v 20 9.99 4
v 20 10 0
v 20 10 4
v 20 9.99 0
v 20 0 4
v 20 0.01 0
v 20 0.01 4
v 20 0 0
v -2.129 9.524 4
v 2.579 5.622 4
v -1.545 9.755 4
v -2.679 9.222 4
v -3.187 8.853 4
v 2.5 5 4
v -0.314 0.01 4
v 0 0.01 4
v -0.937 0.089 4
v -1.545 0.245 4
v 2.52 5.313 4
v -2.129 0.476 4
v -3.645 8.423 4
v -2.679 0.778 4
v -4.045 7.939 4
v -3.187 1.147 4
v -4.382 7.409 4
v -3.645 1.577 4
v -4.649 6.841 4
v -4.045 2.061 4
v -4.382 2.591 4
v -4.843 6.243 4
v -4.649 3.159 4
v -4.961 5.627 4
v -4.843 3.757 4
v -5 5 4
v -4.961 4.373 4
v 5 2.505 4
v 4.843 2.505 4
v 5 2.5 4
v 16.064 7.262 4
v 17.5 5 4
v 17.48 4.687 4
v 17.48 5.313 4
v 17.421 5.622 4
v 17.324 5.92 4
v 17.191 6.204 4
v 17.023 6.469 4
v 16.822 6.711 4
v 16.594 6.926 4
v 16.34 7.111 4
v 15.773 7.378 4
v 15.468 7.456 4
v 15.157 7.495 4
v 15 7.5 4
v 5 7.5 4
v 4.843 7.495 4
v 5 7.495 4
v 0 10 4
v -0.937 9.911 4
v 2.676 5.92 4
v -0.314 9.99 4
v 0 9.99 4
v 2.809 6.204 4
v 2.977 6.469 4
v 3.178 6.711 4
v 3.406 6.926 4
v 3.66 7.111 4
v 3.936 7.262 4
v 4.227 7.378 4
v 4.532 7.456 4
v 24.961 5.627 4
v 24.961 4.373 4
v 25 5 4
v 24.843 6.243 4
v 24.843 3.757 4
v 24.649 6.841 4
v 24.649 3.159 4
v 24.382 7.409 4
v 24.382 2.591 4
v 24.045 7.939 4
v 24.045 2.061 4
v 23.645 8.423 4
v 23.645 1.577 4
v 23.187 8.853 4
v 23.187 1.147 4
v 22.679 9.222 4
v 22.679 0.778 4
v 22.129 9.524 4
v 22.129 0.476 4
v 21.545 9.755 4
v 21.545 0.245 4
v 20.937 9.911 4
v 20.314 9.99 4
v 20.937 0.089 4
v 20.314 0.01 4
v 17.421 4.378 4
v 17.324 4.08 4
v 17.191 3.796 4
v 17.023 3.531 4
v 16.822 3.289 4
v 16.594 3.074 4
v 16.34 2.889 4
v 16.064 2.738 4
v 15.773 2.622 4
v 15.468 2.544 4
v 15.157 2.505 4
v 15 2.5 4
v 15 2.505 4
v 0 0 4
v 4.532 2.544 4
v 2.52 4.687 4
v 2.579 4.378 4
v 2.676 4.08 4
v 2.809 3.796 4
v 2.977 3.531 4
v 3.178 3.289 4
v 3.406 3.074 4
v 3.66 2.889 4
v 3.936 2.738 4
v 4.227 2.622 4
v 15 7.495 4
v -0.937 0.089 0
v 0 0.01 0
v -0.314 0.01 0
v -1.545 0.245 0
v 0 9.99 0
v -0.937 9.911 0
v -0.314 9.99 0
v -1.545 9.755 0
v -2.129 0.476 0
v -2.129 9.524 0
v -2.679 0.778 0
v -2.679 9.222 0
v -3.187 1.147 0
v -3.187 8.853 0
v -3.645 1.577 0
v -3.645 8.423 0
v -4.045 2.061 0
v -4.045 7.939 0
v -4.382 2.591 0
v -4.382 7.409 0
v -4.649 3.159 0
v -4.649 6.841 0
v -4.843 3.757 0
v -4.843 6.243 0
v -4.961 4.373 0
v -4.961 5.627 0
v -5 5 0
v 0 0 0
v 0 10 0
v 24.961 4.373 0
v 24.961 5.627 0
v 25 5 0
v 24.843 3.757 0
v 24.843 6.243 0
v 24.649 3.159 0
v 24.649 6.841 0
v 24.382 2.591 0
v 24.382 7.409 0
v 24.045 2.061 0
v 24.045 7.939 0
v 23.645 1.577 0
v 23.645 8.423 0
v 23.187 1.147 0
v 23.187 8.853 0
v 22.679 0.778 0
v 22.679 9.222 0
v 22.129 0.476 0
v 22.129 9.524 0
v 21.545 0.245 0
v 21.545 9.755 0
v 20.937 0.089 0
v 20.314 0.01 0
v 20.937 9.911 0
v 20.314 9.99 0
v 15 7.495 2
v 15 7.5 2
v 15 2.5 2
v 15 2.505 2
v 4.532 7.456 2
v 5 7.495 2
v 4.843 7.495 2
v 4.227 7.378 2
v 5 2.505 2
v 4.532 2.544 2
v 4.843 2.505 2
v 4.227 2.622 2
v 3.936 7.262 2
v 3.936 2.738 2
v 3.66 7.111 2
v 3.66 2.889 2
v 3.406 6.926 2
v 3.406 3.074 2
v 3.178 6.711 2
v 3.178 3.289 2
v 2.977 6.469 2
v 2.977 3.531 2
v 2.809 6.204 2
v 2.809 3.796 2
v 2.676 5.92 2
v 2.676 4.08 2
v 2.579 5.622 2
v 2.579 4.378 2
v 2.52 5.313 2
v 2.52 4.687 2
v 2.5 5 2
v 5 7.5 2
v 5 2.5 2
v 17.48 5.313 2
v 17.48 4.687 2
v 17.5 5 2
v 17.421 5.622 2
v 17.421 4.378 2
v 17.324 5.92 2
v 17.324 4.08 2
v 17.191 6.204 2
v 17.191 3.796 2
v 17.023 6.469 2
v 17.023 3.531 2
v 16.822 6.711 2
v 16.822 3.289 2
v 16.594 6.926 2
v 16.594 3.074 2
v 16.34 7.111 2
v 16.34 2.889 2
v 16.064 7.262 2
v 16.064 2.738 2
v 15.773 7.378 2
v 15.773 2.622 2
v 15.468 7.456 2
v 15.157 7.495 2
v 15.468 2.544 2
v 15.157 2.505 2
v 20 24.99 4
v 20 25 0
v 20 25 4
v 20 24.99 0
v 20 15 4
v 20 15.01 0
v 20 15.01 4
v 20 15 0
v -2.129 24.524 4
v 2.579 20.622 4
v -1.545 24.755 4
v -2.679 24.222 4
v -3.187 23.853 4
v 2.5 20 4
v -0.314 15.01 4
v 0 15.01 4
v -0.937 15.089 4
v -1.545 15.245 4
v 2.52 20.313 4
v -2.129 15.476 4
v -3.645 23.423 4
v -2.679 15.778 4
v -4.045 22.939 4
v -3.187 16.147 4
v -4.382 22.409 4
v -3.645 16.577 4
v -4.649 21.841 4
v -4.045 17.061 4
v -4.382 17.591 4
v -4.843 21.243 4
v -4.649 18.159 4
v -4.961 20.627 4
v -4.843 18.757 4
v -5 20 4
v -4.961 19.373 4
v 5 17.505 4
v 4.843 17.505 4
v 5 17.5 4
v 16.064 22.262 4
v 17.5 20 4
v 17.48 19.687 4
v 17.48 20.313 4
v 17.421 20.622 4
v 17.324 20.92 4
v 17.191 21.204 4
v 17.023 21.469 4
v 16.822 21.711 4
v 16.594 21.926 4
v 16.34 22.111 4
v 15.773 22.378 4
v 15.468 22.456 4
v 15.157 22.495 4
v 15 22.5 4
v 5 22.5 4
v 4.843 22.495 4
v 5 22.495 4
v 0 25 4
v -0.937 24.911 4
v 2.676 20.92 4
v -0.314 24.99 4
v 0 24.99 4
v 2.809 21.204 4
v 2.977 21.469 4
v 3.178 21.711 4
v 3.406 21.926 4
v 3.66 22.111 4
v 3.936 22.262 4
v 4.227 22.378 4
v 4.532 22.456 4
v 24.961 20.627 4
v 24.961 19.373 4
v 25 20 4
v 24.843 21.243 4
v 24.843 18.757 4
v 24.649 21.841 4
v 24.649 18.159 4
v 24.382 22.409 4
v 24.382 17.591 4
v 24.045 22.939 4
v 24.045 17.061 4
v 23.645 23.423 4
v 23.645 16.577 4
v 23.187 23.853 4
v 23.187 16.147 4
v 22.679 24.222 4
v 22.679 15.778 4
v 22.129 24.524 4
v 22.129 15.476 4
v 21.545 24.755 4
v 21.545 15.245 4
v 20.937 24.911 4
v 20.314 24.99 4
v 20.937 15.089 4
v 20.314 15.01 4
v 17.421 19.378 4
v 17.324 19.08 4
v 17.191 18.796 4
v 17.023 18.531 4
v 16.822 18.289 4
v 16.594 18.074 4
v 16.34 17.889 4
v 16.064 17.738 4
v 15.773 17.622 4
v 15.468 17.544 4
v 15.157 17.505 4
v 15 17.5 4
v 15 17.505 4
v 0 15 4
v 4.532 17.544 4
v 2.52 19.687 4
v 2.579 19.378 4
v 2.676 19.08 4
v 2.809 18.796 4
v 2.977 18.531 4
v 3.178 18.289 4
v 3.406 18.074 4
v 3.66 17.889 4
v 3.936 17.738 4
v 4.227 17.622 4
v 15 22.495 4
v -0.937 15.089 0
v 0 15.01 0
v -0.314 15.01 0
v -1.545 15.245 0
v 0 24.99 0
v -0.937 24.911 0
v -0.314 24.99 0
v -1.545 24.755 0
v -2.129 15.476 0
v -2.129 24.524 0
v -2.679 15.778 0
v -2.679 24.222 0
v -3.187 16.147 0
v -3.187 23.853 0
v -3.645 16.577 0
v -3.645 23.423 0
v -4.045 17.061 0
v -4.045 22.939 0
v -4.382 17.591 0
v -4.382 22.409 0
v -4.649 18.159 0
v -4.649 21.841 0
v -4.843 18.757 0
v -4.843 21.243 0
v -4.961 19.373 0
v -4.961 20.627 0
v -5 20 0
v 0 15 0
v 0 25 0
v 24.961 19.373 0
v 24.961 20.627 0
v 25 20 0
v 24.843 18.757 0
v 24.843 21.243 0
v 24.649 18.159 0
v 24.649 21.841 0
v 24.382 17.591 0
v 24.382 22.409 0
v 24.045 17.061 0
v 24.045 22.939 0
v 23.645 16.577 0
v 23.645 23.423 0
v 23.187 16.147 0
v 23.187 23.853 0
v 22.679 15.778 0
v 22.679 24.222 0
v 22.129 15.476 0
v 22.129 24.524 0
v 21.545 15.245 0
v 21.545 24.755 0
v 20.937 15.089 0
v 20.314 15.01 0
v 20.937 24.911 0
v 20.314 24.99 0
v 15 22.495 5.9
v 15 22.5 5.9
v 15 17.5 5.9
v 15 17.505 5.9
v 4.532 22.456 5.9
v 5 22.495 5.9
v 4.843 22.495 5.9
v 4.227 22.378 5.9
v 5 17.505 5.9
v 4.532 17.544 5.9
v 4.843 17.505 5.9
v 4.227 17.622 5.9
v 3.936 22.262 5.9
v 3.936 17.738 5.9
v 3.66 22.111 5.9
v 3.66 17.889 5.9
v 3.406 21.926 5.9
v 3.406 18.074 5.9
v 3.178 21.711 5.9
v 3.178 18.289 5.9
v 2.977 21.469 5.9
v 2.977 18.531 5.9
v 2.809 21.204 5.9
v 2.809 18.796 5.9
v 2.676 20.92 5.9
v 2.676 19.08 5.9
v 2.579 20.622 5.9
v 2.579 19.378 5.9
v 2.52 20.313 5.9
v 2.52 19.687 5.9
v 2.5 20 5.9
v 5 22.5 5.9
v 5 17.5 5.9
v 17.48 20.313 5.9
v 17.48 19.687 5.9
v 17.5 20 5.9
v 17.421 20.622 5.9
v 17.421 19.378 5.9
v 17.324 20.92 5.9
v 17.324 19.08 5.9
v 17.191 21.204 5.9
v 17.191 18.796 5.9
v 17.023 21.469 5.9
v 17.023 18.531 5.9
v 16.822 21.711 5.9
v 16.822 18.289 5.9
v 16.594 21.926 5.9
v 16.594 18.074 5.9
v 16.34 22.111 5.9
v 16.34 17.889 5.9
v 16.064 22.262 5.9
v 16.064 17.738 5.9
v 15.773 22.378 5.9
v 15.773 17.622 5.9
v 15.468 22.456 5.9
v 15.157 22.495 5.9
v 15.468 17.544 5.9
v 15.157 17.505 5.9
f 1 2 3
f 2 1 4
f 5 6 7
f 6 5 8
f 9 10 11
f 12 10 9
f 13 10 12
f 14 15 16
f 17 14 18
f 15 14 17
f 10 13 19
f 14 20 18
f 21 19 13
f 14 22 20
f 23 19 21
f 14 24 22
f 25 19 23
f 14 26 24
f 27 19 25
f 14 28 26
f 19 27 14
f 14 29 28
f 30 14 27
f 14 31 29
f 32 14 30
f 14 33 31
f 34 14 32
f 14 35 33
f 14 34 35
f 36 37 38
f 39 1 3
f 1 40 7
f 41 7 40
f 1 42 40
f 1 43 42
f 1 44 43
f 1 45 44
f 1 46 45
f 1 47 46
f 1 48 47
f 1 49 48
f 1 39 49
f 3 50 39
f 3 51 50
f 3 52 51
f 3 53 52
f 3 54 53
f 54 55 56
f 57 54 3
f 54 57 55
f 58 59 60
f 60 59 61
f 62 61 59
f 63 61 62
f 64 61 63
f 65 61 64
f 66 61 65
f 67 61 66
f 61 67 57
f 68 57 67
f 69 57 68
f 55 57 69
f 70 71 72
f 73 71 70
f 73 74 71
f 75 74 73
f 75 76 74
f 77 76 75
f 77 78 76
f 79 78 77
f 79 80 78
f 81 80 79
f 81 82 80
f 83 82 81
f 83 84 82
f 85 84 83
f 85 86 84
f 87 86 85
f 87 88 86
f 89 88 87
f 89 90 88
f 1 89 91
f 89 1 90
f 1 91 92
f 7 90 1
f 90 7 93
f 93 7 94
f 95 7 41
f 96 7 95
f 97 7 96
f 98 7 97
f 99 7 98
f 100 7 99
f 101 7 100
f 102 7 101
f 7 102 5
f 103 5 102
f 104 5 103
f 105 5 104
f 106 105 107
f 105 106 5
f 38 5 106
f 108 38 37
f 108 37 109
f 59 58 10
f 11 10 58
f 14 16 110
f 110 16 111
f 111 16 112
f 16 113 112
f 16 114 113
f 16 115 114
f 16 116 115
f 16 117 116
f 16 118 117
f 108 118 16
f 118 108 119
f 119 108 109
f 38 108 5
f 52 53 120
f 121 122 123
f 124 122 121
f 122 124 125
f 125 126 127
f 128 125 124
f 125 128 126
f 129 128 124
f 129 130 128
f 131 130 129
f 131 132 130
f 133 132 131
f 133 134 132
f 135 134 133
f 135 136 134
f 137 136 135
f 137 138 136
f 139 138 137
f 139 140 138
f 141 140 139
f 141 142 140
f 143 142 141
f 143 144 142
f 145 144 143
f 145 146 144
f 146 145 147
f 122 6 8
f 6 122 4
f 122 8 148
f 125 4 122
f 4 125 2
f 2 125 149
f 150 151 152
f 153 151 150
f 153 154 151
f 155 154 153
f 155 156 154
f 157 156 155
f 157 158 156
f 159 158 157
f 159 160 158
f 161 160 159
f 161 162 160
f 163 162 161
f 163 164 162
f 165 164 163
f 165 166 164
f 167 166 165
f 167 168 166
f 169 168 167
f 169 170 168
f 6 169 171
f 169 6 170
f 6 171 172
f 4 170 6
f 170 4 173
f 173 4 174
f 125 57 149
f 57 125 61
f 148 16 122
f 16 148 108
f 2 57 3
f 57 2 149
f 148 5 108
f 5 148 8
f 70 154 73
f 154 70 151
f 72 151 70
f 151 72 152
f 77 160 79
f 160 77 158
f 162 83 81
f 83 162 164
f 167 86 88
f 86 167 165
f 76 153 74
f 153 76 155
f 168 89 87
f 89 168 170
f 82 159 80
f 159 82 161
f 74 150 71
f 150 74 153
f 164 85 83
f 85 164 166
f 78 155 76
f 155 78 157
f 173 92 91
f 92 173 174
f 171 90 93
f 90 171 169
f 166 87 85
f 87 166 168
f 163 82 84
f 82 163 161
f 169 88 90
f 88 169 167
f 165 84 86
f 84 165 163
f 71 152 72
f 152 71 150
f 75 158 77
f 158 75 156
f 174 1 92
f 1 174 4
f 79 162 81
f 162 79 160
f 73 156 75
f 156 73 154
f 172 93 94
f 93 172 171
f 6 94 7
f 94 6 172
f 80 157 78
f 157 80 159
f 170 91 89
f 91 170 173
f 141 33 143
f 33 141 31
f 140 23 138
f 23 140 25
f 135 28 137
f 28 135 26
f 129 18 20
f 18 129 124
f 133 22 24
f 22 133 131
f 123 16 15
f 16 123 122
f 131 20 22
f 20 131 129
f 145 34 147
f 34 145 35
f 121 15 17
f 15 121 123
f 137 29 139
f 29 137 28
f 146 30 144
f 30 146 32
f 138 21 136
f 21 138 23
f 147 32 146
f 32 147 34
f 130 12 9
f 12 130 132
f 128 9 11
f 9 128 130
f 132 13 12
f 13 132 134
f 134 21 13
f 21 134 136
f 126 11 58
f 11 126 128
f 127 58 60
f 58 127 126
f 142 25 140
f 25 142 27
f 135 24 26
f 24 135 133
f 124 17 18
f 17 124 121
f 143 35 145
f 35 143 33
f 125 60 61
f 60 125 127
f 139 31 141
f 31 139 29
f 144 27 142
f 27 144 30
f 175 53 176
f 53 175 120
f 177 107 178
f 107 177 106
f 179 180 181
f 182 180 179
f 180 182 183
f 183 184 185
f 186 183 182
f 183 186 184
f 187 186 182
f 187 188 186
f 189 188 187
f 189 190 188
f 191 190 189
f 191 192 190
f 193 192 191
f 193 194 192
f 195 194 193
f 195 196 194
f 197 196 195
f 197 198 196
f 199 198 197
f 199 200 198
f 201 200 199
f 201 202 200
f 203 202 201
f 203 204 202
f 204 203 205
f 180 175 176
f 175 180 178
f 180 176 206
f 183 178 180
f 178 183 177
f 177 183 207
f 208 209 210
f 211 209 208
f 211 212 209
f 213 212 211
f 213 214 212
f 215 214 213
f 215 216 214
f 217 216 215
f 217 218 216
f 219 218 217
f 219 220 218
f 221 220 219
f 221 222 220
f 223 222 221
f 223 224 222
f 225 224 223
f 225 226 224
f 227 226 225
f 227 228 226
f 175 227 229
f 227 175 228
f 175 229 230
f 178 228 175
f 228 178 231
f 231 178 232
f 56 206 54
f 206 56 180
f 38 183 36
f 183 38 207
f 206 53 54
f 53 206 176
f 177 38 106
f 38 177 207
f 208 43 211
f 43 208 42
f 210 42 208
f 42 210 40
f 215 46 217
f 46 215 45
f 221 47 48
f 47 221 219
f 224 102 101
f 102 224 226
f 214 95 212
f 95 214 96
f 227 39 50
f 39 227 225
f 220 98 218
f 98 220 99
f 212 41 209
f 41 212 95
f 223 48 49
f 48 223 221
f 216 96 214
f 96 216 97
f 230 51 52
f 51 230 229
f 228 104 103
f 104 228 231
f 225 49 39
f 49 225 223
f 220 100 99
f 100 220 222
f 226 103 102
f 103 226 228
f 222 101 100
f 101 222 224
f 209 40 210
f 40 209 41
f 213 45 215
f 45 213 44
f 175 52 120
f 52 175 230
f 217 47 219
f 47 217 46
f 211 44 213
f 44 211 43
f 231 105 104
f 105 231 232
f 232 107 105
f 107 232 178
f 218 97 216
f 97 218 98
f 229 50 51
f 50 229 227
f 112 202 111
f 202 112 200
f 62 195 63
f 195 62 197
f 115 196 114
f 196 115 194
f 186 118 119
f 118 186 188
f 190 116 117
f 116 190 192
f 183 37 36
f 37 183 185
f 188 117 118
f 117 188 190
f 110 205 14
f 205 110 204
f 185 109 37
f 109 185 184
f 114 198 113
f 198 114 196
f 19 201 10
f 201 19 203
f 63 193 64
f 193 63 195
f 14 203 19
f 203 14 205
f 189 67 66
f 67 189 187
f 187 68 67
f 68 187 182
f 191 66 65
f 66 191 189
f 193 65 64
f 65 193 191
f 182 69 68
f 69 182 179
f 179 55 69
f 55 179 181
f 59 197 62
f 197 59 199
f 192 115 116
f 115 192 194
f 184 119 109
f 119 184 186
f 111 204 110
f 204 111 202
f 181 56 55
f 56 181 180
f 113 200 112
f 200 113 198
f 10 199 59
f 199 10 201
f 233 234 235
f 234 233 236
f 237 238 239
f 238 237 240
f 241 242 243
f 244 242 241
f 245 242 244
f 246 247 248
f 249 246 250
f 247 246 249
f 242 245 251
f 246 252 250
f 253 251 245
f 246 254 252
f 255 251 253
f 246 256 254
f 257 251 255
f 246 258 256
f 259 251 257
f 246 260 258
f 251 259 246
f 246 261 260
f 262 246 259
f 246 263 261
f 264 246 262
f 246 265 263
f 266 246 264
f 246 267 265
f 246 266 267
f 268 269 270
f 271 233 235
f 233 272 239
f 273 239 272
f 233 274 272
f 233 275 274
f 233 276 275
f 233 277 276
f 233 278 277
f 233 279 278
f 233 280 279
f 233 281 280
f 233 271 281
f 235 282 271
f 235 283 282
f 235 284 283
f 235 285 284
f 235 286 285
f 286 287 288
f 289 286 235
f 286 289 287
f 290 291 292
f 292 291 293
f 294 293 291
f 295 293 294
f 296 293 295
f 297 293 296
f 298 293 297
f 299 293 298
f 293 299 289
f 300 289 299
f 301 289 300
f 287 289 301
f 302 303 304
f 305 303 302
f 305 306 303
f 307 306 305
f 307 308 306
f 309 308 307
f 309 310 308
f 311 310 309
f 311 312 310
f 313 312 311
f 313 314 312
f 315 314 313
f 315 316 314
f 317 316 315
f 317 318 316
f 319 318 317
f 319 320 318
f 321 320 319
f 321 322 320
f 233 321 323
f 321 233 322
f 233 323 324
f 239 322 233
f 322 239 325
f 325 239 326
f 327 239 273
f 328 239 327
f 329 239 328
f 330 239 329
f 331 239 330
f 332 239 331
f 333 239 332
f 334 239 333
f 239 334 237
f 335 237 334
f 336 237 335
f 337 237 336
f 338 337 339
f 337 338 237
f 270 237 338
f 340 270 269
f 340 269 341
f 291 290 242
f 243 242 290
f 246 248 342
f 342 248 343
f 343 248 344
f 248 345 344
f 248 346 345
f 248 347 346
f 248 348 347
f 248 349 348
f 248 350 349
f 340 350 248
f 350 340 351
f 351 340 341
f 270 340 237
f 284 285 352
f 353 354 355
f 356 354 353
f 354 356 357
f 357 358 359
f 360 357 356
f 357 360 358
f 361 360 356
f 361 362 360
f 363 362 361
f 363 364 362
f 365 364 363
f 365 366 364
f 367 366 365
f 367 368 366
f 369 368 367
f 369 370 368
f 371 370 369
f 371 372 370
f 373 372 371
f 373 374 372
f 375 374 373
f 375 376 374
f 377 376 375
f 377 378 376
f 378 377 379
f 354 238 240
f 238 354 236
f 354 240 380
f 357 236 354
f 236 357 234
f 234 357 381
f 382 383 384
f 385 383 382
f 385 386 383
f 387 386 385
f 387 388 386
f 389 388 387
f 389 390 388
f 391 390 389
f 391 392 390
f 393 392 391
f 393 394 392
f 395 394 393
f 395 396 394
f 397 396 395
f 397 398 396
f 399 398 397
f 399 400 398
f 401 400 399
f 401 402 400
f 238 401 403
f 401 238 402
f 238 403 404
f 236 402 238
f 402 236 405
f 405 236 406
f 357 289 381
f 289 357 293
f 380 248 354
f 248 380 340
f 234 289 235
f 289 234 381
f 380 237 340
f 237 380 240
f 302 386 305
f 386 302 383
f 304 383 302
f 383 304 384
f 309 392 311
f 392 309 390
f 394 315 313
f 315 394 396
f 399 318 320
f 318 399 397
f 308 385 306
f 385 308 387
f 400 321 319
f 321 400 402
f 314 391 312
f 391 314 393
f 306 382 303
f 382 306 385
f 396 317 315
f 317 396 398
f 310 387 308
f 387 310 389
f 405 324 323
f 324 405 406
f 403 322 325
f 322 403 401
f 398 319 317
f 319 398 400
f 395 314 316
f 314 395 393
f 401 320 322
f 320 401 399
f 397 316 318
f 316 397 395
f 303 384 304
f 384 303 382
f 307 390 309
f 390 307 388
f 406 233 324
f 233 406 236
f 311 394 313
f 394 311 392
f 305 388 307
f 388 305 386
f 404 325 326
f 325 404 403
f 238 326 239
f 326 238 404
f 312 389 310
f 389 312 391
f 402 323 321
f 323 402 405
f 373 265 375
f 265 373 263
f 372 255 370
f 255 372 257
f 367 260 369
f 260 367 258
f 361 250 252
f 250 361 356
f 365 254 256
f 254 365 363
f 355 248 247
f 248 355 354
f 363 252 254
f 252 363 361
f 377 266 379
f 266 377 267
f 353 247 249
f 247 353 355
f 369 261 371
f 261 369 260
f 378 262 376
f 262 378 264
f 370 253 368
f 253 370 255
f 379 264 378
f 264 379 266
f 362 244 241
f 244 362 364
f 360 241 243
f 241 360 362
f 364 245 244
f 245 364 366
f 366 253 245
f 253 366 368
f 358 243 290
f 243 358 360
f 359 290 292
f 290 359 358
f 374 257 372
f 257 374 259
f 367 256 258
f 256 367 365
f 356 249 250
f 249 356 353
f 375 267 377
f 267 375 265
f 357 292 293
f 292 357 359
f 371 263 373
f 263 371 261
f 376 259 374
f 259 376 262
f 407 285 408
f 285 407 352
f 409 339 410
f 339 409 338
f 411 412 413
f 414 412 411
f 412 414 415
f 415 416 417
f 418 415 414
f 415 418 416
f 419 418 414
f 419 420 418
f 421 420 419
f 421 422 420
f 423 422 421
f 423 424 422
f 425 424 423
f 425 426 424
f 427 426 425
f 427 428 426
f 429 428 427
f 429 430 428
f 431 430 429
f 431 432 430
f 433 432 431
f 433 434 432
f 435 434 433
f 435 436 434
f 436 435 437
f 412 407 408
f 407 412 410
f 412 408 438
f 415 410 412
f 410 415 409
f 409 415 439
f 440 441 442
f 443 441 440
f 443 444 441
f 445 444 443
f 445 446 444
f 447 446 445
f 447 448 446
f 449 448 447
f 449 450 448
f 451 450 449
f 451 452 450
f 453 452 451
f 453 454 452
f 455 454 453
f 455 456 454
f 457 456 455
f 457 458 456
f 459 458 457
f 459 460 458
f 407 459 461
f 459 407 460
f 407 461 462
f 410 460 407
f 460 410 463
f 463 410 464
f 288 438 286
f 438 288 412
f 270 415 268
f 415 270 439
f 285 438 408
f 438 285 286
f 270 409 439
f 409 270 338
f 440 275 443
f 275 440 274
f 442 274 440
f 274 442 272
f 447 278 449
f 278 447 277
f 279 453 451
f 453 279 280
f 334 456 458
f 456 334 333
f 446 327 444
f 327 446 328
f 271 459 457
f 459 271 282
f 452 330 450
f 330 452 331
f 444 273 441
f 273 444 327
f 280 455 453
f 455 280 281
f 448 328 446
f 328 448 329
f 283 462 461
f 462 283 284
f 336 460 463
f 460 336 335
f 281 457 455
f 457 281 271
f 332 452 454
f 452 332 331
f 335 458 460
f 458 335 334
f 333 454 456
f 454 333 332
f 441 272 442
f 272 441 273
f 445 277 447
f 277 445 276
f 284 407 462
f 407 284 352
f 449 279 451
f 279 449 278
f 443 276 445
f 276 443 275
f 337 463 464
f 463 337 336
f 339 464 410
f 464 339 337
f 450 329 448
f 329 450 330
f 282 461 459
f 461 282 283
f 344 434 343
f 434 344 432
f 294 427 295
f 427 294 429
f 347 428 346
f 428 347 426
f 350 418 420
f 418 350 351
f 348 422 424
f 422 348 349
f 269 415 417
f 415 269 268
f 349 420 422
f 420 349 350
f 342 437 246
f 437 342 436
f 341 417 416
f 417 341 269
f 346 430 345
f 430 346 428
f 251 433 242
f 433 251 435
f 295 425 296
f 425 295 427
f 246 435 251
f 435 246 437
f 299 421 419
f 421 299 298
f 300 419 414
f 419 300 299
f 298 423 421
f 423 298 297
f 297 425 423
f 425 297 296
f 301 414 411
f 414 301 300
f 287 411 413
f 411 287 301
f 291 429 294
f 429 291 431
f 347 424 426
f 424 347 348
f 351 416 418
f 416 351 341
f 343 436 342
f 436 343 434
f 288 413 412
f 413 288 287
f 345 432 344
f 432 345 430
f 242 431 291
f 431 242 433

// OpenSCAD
$fn=50;

width = 20;
depth = 10;
height = 4;

peg_h = 2;


module base()
{
union()
  {
    cube([width,depth,height]);
    translate([width,depth/2,0])
    cylinder(r=depth/2,h=height);

    translate([0,depth/2,0])
    cylinder(r=depth/2,h=height);
  }
}

difference()
{
  base();

translate([width/4, depth/4, height-peg_h])
  scale([.5,.5,1.01*peg_h/height])

  union()
  {
    cube([width,depth,height]);
    translate([width,depth/2,0])
    cylinder(r=depth/2,h=height);

    translate([0,depth/2,0])
    cylinder(r=depth/2,h=height);
  }
}




translate([0,depth+5,0])
{
  base();
  translate([width/4,depth/4,height-.1])
  scale([.5,.5,peg_h/height])
  base();


}
